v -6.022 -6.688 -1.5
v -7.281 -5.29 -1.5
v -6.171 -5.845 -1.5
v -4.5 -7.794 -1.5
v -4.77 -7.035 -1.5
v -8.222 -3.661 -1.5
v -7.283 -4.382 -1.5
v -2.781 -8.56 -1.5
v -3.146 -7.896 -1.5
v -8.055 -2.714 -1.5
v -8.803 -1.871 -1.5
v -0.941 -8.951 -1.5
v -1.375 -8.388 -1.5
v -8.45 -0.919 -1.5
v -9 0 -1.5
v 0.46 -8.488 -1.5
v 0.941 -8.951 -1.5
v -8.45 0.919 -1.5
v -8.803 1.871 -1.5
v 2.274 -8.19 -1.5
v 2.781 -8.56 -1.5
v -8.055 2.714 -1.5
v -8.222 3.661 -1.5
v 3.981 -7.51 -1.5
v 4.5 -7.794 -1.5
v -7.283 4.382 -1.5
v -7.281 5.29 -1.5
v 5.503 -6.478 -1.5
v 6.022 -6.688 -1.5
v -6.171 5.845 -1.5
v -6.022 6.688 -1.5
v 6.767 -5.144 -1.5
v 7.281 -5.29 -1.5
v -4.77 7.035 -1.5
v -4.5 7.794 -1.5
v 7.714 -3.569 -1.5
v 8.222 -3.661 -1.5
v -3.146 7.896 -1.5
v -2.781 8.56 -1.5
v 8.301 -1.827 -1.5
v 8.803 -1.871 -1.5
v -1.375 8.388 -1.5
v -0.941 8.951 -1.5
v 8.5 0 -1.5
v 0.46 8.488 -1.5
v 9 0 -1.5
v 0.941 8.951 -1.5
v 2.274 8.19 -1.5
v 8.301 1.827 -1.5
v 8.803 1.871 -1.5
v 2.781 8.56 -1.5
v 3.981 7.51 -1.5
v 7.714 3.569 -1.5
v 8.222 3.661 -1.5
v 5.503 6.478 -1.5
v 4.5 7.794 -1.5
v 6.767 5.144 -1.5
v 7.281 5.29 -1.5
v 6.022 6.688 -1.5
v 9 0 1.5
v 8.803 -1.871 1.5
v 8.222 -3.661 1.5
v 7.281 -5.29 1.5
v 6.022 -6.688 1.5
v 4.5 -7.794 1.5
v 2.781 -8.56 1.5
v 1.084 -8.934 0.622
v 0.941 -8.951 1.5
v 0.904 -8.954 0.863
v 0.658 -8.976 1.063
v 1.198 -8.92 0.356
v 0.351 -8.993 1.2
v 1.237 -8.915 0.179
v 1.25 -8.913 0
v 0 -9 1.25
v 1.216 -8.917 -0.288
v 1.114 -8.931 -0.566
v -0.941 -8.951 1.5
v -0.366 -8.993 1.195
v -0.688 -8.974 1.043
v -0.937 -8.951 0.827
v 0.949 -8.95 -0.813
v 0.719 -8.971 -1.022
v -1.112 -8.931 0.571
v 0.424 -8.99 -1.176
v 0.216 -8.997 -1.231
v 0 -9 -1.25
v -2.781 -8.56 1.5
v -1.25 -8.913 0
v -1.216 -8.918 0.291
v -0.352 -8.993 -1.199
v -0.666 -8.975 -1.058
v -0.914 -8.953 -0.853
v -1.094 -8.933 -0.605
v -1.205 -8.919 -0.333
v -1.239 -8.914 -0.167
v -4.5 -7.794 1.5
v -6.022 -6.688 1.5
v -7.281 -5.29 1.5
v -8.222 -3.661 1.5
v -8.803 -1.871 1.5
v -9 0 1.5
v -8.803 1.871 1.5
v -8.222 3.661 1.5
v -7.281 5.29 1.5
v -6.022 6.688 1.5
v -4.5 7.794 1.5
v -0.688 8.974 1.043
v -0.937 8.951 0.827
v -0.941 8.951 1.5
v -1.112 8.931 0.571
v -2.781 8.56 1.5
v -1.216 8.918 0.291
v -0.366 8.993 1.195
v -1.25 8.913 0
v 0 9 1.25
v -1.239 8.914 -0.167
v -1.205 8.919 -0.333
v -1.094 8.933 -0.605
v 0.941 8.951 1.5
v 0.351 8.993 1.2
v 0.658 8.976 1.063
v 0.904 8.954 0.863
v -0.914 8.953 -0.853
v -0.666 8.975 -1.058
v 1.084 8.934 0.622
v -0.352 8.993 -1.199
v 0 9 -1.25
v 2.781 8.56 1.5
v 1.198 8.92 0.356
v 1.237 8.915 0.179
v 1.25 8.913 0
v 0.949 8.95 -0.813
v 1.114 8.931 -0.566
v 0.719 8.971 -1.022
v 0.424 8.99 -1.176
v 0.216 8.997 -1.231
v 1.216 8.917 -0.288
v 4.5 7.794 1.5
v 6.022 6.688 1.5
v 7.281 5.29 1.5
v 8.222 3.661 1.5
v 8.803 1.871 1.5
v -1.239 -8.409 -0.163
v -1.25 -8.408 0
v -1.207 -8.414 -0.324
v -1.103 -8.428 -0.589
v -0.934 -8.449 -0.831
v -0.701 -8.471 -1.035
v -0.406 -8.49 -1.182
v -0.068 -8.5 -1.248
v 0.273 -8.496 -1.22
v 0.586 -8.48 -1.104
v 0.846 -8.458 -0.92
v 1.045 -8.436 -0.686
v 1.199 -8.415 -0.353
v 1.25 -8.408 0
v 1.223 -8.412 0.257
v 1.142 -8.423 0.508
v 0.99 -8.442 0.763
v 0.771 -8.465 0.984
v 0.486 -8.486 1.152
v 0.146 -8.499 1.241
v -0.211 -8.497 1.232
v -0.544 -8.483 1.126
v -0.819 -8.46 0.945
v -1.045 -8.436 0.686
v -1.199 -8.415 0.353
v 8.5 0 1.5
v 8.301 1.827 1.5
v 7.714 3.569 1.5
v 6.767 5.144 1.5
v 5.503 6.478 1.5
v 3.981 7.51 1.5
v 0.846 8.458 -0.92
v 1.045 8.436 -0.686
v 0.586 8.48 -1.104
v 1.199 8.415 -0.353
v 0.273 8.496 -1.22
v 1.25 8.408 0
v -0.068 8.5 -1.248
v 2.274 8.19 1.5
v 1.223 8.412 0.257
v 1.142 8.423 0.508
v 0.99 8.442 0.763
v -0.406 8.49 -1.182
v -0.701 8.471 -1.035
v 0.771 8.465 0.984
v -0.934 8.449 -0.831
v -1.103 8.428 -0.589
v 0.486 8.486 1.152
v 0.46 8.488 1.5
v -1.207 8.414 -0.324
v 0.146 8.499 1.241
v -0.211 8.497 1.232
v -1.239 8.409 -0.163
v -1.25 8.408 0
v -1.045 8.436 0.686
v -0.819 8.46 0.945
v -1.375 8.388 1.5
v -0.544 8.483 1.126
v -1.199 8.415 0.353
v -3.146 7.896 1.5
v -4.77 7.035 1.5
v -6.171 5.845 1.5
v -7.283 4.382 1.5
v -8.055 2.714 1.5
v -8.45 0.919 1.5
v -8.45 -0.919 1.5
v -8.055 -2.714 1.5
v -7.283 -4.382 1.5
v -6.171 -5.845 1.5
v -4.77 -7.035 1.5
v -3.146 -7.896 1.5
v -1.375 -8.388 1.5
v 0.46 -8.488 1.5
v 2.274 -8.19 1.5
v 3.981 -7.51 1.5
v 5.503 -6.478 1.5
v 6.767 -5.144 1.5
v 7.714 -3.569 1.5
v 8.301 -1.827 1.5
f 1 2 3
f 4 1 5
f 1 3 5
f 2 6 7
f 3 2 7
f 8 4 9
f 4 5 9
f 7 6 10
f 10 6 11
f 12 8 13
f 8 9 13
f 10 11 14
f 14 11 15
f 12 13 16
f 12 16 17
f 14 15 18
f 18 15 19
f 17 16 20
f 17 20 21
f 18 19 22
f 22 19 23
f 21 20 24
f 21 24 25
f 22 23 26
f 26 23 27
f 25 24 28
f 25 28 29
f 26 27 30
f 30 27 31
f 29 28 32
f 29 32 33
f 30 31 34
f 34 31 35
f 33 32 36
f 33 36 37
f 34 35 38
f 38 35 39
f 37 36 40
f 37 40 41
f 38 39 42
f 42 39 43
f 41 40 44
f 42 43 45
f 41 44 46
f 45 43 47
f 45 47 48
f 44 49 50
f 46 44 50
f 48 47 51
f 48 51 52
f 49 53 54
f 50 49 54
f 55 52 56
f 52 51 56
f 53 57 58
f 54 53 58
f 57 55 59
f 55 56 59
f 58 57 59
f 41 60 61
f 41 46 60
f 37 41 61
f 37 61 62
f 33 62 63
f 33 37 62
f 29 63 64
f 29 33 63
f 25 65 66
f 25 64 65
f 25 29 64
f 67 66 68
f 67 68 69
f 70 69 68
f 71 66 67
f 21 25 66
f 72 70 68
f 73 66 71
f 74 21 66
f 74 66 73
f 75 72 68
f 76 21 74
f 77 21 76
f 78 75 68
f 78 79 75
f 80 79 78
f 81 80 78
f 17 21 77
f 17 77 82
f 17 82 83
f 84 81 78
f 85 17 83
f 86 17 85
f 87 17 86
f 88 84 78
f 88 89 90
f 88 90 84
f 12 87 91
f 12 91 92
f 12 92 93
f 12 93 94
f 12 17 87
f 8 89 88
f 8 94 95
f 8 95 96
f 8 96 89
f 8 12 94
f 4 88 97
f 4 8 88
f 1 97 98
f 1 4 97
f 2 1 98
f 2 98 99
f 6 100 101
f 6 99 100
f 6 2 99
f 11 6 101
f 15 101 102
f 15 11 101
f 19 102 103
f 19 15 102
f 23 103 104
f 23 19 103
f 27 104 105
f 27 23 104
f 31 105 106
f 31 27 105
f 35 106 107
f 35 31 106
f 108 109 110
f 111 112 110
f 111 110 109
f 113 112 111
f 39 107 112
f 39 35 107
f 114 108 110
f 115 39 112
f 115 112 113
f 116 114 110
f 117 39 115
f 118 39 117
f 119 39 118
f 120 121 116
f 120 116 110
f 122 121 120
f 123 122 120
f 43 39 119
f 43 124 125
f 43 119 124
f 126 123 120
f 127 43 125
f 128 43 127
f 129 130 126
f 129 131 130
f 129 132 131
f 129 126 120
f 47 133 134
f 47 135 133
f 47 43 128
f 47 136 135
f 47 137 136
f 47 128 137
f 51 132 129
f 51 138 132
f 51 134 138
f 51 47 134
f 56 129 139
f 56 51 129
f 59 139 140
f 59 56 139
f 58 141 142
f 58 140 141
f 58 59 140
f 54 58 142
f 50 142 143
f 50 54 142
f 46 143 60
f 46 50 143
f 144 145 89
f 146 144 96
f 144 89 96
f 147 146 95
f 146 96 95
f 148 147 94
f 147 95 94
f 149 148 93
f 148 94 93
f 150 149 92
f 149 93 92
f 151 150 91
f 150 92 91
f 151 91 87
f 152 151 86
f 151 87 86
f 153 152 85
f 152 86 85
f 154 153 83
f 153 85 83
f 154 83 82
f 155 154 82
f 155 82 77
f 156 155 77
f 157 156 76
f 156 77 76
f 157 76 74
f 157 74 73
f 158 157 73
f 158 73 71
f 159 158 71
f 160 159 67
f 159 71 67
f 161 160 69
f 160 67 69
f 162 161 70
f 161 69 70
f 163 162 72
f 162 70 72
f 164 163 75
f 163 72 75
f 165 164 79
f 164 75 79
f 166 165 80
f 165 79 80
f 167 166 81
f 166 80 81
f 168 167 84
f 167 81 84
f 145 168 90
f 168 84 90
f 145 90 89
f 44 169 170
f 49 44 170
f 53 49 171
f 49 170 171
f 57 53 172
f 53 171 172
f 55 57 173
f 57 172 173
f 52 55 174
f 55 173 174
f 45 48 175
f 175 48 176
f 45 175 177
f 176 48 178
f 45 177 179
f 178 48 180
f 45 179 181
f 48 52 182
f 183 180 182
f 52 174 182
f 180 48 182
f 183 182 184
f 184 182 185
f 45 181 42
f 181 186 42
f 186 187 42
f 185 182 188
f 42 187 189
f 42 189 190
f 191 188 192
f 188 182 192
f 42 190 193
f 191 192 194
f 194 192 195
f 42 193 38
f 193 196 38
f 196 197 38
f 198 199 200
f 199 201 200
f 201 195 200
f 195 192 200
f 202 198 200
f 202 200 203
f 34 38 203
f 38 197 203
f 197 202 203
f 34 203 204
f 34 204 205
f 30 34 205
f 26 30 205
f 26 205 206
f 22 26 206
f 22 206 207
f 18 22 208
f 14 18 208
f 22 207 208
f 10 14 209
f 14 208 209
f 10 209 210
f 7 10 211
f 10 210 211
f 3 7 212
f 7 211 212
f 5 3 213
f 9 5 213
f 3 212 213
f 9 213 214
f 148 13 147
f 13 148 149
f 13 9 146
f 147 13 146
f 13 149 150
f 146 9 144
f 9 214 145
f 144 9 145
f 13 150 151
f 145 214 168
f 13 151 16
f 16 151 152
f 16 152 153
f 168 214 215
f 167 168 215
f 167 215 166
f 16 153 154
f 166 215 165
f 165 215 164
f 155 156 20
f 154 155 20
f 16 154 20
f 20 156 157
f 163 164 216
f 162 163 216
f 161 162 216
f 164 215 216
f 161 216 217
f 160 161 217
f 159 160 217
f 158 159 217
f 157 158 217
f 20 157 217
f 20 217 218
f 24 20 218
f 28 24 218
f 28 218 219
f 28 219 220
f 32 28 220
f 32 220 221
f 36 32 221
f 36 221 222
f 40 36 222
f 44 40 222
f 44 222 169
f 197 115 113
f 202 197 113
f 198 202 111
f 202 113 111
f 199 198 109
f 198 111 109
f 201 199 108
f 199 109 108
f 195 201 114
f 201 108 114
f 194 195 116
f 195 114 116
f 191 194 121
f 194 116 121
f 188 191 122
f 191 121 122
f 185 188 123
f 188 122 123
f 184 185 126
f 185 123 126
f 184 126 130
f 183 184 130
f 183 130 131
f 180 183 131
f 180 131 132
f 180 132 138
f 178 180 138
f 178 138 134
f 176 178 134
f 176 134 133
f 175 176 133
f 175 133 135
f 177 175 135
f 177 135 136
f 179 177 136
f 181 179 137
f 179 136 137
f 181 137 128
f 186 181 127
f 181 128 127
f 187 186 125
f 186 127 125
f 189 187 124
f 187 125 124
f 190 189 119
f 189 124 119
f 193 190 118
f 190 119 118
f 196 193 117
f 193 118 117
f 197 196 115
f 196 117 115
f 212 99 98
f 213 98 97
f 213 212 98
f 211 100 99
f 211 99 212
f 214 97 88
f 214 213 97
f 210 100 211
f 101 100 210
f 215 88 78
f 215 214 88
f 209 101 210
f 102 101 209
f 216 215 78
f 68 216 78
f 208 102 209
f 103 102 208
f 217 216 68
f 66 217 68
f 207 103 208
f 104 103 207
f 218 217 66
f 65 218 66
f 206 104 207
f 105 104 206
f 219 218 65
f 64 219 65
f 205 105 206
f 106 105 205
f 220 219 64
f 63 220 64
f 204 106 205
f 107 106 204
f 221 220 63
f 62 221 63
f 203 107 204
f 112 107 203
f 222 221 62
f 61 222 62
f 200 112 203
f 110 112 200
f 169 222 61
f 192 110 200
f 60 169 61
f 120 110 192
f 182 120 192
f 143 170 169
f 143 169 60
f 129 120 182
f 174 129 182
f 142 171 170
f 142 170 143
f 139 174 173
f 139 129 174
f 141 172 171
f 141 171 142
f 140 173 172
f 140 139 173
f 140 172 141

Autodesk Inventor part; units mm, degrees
ref_plane "YZ Plane" through (0, 0, 0) normal (1, 0, 0) x (0, 1, 0)
ref_plane "XY Plane" through (0, 0, 0) normal (0, 0, 1) x (1, 0, 0)
sketch "Sketch1" plane through (0, 0, 0) normal (0, 0, 1) x (1, 0, 0)
  circle A0 centre (0, 0) radius 9
  circle A1 centre (0, 0) radius 8.5
  dimension "d0" = 18
  dimension "d1" = 17
extrude "Extrusion1" add sketch "Sketch1" along normal mid plane 3
ref_plane "Work Plane1" through (0, 9, 0) normal (0, 1, 0) x (-1, 0, 0)
sketch "Sketch2" plane through (0, 9, 0) normal (0, 1, 0) x (-1, 0, 0)
  circle A0 centre (0, 0) radius 1.25
  dimension "d5" = 2.5
extrude "Extrusion2" cut sketch "Sketch2" against normal up to surface
mirror "Mirror1" about plane through (0, 0, 0) normal (0, 1, 0) of "Extrusion2"
properties part number "21.1"
